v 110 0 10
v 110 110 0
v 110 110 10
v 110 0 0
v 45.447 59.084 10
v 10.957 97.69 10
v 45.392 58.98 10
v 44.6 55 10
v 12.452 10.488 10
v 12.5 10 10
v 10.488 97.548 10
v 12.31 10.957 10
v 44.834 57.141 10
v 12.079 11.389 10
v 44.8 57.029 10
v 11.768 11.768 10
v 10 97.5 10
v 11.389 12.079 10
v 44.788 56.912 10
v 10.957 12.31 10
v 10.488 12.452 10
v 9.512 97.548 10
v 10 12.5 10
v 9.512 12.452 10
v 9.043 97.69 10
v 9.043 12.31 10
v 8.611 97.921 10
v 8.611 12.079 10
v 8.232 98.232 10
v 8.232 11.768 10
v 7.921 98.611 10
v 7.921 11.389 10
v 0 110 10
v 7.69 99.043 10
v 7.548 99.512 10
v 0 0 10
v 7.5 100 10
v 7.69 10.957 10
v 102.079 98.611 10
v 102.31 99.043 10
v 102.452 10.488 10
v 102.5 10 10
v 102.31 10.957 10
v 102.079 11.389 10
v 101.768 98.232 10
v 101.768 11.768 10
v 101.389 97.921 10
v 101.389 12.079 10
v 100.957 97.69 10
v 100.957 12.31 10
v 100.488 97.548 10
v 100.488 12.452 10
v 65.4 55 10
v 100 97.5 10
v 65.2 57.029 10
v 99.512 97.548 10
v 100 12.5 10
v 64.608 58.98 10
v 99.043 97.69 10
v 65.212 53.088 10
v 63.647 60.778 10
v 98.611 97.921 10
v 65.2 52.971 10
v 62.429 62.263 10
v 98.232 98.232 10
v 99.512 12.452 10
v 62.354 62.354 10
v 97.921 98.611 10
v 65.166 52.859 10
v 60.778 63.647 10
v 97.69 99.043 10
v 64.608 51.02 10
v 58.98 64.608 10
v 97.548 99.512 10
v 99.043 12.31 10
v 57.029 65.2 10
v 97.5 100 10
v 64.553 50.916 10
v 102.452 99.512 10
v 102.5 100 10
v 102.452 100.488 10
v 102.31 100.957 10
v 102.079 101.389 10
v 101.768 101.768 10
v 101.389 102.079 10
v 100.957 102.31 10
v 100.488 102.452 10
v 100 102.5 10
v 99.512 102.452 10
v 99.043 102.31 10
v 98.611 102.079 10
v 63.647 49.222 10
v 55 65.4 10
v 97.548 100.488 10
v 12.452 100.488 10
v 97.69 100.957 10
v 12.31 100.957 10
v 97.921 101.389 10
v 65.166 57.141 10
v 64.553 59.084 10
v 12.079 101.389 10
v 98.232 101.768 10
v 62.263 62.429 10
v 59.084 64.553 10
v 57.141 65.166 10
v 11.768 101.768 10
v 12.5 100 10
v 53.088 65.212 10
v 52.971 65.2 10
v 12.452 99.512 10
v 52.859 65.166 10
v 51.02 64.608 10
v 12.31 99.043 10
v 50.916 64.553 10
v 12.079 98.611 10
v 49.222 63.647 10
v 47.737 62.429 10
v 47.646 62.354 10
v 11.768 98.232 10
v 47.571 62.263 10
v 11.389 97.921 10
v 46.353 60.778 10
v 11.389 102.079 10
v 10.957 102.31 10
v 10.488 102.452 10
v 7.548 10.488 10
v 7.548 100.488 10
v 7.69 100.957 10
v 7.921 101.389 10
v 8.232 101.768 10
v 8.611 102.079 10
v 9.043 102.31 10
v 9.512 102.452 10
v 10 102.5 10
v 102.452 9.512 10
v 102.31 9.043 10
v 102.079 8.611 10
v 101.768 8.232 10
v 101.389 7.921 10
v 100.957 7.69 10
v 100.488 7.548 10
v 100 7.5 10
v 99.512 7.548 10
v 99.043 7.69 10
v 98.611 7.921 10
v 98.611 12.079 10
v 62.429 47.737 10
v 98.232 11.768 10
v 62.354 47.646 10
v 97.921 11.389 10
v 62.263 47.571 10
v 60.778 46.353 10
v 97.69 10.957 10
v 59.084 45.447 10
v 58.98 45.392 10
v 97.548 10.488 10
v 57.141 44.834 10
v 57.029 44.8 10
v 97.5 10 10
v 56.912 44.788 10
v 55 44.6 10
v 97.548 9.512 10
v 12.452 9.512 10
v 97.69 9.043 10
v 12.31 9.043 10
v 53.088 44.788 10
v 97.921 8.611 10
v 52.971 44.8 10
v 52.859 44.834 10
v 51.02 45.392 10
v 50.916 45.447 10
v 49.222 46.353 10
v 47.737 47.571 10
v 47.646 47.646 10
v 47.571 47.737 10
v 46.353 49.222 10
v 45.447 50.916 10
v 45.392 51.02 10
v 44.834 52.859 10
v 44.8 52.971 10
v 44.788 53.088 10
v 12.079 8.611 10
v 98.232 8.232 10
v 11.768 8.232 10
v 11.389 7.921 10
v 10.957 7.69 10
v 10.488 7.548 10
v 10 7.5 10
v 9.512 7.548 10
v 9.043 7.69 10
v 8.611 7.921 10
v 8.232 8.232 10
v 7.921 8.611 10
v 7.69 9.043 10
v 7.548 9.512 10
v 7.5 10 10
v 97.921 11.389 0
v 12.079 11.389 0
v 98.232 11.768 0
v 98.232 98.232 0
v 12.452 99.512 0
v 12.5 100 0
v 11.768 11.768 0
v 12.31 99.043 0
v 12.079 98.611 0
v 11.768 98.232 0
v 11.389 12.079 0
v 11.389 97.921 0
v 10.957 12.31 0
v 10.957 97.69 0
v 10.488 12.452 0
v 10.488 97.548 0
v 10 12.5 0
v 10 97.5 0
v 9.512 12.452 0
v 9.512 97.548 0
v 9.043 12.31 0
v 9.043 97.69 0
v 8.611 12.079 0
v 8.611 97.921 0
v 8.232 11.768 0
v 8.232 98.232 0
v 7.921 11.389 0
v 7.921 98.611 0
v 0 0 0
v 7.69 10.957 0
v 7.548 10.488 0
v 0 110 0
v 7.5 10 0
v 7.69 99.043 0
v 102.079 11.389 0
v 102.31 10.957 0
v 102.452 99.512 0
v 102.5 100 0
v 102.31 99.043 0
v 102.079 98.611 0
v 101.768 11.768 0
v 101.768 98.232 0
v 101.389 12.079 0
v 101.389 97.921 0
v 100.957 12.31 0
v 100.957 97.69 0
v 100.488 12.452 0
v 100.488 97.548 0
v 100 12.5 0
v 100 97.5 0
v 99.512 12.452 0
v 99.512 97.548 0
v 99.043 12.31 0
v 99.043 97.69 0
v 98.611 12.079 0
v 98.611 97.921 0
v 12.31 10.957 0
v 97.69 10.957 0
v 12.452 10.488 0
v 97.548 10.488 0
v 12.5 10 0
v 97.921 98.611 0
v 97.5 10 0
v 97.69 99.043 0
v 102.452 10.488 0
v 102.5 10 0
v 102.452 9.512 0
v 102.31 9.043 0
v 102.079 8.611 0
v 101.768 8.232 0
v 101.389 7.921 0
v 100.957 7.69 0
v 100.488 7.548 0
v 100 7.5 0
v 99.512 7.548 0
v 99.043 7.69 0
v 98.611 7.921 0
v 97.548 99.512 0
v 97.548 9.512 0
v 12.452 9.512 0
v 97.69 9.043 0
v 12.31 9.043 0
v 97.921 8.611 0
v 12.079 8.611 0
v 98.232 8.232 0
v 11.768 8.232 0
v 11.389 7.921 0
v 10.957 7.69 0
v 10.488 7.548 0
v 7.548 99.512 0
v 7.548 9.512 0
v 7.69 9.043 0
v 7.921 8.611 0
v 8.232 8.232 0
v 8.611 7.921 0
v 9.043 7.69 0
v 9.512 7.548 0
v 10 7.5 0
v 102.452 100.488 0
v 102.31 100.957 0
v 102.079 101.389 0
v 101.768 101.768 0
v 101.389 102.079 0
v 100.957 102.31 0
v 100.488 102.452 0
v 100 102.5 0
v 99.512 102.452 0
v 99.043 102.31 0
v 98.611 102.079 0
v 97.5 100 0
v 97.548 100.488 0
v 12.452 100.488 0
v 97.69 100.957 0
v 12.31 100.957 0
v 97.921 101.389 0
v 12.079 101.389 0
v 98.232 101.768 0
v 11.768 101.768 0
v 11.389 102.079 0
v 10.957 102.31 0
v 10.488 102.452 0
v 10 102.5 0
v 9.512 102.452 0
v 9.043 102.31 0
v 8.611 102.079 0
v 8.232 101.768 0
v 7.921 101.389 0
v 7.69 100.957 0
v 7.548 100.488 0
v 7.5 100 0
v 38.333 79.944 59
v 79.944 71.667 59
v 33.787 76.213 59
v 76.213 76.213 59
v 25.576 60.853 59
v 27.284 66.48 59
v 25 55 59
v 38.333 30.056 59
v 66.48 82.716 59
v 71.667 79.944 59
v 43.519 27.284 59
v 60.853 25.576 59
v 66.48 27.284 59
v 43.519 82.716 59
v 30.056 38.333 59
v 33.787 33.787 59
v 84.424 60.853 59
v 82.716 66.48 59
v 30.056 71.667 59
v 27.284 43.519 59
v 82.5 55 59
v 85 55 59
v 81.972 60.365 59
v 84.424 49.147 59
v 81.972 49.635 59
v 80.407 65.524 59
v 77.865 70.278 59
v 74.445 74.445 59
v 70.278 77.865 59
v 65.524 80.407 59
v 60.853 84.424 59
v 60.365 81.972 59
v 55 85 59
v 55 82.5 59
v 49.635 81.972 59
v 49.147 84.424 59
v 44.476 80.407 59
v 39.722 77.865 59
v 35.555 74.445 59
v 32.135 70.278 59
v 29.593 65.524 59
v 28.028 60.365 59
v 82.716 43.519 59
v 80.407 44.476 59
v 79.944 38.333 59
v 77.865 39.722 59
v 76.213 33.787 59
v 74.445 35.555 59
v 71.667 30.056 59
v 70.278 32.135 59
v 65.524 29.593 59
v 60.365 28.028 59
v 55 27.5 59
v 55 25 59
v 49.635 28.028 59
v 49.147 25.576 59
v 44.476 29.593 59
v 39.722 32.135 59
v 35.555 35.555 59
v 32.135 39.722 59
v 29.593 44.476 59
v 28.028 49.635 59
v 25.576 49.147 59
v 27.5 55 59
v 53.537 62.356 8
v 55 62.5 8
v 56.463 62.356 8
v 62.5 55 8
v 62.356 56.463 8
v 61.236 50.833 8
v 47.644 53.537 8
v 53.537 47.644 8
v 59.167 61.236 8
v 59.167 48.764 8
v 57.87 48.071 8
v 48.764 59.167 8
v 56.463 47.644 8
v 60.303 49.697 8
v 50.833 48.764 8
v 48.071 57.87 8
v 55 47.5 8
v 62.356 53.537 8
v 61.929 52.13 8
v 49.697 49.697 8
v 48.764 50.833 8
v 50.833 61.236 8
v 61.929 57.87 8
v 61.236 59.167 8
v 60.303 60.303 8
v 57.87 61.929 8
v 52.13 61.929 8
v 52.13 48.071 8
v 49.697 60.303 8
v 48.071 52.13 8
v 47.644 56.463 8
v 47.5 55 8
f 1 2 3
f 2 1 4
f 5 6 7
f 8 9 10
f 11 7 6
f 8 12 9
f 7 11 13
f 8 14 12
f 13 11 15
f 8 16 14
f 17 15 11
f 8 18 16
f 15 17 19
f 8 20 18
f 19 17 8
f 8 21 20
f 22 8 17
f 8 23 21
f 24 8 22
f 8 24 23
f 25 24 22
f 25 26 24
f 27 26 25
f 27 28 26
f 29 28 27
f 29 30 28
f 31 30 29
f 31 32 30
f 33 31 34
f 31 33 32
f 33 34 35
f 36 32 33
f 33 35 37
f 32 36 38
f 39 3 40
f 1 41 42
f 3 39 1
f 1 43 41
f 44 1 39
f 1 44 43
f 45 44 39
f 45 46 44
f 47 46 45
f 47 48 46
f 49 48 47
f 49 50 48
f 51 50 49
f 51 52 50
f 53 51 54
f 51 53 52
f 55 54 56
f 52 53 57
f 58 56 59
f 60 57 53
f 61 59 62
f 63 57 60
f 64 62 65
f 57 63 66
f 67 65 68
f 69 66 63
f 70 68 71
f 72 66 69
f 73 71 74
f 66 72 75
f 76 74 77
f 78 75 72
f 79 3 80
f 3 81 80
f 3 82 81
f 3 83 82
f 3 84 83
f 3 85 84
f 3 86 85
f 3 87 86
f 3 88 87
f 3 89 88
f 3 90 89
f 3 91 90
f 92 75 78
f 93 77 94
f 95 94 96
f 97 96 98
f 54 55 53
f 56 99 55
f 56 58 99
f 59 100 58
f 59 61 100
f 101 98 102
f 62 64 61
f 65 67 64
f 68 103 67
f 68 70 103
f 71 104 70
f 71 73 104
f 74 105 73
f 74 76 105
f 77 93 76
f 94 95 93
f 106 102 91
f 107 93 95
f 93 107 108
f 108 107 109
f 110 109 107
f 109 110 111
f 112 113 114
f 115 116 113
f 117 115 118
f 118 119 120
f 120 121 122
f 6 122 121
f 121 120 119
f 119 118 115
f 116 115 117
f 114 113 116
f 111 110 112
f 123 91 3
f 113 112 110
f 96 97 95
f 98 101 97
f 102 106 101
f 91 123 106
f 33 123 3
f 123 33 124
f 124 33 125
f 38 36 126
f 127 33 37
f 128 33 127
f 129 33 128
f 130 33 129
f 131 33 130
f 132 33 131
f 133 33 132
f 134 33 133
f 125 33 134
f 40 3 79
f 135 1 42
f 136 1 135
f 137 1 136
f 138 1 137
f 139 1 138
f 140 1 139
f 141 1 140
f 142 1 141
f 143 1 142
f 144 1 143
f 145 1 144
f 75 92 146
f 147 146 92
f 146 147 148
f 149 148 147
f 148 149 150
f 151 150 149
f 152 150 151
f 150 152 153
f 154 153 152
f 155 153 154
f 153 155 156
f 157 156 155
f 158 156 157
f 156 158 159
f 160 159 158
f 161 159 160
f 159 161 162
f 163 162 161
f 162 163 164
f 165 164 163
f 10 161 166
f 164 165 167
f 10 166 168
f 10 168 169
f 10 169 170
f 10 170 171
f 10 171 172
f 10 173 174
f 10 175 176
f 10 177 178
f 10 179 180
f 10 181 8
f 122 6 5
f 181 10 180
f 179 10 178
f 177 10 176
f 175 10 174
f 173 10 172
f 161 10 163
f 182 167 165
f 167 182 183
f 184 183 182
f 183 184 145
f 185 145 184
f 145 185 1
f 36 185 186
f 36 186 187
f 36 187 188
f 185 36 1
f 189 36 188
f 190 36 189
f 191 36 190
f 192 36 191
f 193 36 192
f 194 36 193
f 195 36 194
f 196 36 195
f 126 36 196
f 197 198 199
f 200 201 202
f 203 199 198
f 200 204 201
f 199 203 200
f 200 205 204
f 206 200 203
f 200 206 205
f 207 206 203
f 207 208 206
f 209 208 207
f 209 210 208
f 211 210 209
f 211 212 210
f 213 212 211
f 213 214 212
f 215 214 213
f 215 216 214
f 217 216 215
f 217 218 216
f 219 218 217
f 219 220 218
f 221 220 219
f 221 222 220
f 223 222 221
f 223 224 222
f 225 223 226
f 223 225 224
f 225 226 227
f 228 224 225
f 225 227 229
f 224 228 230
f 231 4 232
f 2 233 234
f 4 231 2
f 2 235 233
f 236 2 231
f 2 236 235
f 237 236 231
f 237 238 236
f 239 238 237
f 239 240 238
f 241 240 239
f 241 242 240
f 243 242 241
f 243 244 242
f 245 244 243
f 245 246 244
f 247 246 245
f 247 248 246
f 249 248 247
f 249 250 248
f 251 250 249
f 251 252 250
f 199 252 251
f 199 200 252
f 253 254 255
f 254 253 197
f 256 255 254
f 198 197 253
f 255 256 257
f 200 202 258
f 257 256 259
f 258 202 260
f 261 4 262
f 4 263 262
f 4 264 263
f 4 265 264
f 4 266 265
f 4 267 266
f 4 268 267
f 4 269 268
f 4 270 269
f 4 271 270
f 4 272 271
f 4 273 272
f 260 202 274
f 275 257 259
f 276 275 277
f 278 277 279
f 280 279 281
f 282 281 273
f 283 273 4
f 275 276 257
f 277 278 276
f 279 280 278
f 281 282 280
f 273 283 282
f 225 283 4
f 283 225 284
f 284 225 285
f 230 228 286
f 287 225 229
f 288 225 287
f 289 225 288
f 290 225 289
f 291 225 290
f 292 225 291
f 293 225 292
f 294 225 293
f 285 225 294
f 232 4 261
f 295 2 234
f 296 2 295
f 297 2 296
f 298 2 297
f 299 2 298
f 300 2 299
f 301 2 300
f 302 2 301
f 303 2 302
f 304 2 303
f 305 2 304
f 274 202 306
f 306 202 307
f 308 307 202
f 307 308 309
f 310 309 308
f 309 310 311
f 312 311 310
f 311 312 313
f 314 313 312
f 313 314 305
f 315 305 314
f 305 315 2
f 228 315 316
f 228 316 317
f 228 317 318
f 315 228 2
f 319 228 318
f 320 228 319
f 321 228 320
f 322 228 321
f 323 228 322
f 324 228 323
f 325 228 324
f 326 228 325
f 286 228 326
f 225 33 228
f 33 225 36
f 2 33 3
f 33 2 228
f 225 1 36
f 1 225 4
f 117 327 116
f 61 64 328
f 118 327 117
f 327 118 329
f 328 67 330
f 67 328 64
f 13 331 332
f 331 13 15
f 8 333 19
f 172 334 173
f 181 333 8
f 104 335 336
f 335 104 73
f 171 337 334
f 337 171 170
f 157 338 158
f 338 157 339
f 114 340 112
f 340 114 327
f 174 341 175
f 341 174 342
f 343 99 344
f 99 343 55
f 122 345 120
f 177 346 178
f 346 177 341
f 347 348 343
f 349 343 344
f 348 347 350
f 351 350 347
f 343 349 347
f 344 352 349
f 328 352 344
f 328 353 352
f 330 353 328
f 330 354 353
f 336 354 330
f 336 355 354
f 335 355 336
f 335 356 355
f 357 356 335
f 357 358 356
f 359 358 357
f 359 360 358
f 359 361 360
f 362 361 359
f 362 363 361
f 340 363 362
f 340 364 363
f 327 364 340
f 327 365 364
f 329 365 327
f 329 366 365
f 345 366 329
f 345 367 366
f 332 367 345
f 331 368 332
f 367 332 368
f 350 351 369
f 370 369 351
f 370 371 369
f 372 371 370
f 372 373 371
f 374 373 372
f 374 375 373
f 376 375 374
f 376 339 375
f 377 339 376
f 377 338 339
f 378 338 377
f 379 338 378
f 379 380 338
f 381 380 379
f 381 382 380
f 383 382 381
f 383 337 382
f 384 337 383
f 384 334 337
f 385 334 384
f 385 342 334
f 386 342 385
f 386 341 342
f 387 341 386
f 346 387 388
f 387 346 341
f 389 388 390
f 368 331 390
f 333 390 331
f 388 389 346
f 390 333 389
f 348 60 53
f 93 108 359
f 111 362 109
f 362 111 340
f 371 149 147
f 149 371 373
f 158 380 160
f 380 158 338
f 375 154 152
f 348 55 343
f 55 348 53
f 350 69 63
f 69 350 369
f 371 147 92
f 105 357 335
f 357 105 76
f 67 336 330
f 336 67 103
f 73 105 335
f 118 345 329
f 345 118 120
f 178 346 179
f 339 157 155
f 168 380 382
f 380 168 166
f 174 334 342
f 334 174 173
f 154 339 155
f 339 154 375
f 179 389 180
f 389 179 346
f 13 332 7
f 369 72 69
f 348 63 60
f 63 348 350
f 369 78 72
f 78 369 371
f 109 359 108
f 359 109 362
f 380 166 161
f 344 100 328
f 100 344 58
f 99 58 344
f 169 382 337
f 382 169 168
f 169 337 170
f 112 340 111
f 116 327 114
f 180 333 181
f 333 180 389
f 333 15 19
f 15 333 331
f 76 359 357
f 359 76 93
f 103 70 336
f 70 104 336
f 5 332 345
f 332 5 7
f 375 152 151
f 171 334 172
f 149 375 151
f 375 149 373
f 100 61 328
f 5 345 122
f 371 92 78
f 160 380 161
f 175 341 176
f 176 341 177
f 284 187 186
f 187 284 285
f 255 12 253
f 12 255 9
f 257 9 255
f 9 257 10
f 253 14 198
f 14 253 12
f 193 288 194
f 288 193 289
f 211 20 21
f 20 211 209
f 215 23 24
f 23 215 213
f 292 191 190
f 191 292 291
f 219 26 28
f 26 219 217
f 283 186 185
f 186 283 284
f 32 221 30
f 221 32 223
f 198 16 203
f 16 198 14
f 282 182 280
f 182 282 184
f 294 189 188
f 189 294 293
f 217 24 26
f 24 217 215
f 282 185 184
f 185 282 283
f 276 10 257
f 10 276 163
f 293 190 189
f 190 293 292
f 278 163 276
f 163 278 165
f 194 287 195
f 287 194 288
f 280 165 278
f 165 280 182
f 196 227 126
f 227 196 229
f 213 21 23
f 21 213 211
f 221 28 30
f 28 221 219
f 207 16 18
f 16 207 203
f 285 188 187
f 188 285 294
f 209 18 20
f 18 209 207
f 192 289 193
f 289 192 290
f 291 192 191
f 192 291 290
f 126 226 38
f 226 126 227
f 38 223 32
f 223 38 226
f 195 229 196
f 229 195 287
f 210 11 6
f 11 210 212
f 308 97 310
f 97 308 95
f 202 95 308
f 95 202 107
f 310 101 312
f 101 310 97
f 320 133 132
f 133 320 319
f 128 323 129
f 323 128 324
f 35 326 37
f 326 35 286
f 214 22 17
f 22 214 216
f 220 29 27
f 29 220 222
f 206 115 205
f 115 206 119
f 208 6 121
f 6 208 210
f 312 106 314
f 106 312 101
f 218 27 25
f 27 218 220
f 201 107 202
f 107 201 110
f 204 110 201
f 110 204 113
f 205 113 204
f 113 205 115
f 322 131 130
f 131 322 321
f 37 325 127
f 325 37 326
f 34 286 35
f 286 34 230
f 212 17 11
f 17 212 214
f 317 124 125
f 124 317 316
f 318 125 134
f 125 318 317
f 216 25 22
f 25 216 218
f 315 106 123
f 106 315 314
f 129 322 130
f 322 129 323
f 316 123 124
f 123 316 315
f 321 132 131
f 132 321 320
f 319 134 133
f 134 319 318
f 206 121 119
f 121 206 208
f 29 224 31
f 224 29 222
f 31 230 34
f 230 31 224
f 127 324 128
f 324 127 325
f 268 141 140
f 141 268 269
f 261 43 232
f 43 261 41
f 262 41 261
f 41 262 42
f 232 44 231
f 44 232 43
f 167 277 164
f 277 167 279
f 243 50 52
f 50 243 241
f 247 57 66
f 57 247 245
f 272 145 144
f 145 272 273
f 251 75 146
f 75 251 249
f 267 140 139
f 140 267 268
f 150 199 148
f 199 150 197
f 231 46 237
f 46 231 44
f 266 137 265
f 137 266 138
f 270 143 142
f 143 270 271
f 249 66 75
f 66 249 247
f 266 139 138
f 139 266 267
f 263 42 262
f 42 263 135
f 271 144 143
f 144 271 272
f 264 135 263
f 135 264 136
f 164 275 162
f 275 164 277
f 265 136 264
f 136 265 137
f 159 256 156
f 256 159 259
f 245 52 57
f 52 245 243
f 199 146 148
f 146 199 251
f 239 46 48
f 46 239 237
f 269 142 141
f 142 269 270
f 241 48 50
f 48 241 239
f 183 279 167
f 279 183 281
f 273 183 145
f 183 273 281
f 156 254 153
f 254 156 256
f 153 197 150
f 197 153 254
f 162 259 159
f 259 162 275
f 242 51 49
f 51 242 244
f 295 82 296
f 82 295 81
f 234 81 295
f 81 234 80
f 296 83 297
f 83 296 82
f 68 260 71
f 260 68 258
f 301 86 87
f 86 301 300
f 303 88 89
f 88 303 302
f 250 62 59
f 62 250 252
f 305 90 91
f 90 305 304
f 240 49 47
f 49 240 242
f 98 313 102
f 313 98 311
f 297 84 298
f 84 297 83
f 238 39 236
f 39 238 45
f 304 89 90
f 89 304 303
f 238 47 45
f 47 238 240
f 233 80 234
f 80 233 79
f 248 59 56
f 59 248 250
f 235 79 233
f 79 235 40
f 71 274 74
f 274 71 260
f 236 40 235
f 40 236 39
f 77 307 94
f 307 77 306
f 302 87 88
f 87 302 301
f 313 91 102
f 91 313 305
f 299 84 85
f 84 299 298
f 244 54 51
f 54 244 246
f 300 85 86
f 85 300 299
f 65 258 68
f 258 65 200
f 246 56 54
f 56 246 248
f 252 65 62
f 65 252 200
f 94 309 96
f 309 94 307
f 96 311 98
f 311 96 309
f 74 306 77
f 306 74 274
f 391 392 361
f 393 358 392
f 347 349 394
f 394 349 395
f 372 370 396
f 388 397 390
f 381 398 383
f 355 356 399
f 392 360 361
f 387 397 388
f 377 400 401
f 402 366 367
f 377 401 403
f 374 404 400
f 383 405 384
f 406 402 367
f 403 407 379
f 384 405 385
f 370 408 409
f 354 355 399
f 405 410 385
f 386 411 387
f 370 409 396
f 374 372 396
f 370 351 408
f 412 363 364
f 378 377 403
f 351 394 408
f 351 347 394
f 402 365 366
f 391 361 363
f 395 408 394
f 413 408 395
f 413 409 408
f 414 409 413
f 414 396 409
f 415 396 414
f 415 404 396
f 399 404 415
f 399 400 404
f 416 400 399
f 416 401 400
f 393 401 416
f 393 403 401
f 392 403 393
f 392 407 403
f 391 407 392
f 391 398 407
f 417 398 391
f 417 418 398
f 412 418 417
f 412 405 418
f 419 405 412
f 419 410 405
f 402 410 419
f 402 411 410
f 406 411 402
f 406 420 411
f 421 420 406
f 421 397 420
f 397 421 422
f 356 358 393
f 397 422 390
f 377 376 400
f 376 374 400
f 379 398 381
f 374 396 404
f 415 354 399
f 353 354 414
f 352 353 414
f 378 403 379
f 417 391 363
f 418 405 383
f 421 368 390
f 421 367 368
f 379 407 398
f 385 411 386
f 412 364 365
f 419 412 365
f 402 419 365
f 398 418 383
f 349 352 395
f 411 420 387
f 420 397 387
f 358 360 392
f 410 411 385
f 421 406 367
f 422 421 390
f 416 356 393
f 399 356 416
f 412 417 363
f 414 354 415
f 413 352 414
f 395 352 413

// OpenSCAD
$fn = 32;

// ----------------------------------------------------------------------
// Hopper: flanged with square flange
// ----------------------------------------------------------------------

// --- parameters (mm) ---
fl = 110;                 // flange side, X and Y
fl_t = 10;                // flange thickness
cone_h = 50;              // cone height above the flange
top_d = 60;               // cone mouth diameter
bot_d = 20;               // cone spout diameter
wall = 2.5;               // cone wall thickness
hole_r = 2.5;             // flange hole radius
hole_in = 10;             // hole inset from the corners
fit_tol = 0.05;           // tolerance for press fits, mm
free_tol = 0.3;           // tolerance for clearance fits, mm

bore_d = bot_d - 2 * wall;  // spout bore diameter
total_h = fl_t + cone_h - 1;  // overall height

difference() {
  union() {
    cube([fl, fl, fl_t]);
    translate([fl / 2, fl / 2, fl_t - 1])
      cylinder(h = cone_h, d1 = bot_d, d2 = top_d);
  }
  translate([fl / 2, fl / 2, fl_t - 2])
    cylinder(h = cone_h + 1, d1 = bore_d, d2 = top_d - 2 * wall);
  for (sx = [0, 1], sy = [0, 1])
    translate([sx ? fl - hole_in : hole_in,
               sy ? fl - hole_in : hole_in, -1])
      cylinder(r = hole_r, h = fl_t + 2);
}
